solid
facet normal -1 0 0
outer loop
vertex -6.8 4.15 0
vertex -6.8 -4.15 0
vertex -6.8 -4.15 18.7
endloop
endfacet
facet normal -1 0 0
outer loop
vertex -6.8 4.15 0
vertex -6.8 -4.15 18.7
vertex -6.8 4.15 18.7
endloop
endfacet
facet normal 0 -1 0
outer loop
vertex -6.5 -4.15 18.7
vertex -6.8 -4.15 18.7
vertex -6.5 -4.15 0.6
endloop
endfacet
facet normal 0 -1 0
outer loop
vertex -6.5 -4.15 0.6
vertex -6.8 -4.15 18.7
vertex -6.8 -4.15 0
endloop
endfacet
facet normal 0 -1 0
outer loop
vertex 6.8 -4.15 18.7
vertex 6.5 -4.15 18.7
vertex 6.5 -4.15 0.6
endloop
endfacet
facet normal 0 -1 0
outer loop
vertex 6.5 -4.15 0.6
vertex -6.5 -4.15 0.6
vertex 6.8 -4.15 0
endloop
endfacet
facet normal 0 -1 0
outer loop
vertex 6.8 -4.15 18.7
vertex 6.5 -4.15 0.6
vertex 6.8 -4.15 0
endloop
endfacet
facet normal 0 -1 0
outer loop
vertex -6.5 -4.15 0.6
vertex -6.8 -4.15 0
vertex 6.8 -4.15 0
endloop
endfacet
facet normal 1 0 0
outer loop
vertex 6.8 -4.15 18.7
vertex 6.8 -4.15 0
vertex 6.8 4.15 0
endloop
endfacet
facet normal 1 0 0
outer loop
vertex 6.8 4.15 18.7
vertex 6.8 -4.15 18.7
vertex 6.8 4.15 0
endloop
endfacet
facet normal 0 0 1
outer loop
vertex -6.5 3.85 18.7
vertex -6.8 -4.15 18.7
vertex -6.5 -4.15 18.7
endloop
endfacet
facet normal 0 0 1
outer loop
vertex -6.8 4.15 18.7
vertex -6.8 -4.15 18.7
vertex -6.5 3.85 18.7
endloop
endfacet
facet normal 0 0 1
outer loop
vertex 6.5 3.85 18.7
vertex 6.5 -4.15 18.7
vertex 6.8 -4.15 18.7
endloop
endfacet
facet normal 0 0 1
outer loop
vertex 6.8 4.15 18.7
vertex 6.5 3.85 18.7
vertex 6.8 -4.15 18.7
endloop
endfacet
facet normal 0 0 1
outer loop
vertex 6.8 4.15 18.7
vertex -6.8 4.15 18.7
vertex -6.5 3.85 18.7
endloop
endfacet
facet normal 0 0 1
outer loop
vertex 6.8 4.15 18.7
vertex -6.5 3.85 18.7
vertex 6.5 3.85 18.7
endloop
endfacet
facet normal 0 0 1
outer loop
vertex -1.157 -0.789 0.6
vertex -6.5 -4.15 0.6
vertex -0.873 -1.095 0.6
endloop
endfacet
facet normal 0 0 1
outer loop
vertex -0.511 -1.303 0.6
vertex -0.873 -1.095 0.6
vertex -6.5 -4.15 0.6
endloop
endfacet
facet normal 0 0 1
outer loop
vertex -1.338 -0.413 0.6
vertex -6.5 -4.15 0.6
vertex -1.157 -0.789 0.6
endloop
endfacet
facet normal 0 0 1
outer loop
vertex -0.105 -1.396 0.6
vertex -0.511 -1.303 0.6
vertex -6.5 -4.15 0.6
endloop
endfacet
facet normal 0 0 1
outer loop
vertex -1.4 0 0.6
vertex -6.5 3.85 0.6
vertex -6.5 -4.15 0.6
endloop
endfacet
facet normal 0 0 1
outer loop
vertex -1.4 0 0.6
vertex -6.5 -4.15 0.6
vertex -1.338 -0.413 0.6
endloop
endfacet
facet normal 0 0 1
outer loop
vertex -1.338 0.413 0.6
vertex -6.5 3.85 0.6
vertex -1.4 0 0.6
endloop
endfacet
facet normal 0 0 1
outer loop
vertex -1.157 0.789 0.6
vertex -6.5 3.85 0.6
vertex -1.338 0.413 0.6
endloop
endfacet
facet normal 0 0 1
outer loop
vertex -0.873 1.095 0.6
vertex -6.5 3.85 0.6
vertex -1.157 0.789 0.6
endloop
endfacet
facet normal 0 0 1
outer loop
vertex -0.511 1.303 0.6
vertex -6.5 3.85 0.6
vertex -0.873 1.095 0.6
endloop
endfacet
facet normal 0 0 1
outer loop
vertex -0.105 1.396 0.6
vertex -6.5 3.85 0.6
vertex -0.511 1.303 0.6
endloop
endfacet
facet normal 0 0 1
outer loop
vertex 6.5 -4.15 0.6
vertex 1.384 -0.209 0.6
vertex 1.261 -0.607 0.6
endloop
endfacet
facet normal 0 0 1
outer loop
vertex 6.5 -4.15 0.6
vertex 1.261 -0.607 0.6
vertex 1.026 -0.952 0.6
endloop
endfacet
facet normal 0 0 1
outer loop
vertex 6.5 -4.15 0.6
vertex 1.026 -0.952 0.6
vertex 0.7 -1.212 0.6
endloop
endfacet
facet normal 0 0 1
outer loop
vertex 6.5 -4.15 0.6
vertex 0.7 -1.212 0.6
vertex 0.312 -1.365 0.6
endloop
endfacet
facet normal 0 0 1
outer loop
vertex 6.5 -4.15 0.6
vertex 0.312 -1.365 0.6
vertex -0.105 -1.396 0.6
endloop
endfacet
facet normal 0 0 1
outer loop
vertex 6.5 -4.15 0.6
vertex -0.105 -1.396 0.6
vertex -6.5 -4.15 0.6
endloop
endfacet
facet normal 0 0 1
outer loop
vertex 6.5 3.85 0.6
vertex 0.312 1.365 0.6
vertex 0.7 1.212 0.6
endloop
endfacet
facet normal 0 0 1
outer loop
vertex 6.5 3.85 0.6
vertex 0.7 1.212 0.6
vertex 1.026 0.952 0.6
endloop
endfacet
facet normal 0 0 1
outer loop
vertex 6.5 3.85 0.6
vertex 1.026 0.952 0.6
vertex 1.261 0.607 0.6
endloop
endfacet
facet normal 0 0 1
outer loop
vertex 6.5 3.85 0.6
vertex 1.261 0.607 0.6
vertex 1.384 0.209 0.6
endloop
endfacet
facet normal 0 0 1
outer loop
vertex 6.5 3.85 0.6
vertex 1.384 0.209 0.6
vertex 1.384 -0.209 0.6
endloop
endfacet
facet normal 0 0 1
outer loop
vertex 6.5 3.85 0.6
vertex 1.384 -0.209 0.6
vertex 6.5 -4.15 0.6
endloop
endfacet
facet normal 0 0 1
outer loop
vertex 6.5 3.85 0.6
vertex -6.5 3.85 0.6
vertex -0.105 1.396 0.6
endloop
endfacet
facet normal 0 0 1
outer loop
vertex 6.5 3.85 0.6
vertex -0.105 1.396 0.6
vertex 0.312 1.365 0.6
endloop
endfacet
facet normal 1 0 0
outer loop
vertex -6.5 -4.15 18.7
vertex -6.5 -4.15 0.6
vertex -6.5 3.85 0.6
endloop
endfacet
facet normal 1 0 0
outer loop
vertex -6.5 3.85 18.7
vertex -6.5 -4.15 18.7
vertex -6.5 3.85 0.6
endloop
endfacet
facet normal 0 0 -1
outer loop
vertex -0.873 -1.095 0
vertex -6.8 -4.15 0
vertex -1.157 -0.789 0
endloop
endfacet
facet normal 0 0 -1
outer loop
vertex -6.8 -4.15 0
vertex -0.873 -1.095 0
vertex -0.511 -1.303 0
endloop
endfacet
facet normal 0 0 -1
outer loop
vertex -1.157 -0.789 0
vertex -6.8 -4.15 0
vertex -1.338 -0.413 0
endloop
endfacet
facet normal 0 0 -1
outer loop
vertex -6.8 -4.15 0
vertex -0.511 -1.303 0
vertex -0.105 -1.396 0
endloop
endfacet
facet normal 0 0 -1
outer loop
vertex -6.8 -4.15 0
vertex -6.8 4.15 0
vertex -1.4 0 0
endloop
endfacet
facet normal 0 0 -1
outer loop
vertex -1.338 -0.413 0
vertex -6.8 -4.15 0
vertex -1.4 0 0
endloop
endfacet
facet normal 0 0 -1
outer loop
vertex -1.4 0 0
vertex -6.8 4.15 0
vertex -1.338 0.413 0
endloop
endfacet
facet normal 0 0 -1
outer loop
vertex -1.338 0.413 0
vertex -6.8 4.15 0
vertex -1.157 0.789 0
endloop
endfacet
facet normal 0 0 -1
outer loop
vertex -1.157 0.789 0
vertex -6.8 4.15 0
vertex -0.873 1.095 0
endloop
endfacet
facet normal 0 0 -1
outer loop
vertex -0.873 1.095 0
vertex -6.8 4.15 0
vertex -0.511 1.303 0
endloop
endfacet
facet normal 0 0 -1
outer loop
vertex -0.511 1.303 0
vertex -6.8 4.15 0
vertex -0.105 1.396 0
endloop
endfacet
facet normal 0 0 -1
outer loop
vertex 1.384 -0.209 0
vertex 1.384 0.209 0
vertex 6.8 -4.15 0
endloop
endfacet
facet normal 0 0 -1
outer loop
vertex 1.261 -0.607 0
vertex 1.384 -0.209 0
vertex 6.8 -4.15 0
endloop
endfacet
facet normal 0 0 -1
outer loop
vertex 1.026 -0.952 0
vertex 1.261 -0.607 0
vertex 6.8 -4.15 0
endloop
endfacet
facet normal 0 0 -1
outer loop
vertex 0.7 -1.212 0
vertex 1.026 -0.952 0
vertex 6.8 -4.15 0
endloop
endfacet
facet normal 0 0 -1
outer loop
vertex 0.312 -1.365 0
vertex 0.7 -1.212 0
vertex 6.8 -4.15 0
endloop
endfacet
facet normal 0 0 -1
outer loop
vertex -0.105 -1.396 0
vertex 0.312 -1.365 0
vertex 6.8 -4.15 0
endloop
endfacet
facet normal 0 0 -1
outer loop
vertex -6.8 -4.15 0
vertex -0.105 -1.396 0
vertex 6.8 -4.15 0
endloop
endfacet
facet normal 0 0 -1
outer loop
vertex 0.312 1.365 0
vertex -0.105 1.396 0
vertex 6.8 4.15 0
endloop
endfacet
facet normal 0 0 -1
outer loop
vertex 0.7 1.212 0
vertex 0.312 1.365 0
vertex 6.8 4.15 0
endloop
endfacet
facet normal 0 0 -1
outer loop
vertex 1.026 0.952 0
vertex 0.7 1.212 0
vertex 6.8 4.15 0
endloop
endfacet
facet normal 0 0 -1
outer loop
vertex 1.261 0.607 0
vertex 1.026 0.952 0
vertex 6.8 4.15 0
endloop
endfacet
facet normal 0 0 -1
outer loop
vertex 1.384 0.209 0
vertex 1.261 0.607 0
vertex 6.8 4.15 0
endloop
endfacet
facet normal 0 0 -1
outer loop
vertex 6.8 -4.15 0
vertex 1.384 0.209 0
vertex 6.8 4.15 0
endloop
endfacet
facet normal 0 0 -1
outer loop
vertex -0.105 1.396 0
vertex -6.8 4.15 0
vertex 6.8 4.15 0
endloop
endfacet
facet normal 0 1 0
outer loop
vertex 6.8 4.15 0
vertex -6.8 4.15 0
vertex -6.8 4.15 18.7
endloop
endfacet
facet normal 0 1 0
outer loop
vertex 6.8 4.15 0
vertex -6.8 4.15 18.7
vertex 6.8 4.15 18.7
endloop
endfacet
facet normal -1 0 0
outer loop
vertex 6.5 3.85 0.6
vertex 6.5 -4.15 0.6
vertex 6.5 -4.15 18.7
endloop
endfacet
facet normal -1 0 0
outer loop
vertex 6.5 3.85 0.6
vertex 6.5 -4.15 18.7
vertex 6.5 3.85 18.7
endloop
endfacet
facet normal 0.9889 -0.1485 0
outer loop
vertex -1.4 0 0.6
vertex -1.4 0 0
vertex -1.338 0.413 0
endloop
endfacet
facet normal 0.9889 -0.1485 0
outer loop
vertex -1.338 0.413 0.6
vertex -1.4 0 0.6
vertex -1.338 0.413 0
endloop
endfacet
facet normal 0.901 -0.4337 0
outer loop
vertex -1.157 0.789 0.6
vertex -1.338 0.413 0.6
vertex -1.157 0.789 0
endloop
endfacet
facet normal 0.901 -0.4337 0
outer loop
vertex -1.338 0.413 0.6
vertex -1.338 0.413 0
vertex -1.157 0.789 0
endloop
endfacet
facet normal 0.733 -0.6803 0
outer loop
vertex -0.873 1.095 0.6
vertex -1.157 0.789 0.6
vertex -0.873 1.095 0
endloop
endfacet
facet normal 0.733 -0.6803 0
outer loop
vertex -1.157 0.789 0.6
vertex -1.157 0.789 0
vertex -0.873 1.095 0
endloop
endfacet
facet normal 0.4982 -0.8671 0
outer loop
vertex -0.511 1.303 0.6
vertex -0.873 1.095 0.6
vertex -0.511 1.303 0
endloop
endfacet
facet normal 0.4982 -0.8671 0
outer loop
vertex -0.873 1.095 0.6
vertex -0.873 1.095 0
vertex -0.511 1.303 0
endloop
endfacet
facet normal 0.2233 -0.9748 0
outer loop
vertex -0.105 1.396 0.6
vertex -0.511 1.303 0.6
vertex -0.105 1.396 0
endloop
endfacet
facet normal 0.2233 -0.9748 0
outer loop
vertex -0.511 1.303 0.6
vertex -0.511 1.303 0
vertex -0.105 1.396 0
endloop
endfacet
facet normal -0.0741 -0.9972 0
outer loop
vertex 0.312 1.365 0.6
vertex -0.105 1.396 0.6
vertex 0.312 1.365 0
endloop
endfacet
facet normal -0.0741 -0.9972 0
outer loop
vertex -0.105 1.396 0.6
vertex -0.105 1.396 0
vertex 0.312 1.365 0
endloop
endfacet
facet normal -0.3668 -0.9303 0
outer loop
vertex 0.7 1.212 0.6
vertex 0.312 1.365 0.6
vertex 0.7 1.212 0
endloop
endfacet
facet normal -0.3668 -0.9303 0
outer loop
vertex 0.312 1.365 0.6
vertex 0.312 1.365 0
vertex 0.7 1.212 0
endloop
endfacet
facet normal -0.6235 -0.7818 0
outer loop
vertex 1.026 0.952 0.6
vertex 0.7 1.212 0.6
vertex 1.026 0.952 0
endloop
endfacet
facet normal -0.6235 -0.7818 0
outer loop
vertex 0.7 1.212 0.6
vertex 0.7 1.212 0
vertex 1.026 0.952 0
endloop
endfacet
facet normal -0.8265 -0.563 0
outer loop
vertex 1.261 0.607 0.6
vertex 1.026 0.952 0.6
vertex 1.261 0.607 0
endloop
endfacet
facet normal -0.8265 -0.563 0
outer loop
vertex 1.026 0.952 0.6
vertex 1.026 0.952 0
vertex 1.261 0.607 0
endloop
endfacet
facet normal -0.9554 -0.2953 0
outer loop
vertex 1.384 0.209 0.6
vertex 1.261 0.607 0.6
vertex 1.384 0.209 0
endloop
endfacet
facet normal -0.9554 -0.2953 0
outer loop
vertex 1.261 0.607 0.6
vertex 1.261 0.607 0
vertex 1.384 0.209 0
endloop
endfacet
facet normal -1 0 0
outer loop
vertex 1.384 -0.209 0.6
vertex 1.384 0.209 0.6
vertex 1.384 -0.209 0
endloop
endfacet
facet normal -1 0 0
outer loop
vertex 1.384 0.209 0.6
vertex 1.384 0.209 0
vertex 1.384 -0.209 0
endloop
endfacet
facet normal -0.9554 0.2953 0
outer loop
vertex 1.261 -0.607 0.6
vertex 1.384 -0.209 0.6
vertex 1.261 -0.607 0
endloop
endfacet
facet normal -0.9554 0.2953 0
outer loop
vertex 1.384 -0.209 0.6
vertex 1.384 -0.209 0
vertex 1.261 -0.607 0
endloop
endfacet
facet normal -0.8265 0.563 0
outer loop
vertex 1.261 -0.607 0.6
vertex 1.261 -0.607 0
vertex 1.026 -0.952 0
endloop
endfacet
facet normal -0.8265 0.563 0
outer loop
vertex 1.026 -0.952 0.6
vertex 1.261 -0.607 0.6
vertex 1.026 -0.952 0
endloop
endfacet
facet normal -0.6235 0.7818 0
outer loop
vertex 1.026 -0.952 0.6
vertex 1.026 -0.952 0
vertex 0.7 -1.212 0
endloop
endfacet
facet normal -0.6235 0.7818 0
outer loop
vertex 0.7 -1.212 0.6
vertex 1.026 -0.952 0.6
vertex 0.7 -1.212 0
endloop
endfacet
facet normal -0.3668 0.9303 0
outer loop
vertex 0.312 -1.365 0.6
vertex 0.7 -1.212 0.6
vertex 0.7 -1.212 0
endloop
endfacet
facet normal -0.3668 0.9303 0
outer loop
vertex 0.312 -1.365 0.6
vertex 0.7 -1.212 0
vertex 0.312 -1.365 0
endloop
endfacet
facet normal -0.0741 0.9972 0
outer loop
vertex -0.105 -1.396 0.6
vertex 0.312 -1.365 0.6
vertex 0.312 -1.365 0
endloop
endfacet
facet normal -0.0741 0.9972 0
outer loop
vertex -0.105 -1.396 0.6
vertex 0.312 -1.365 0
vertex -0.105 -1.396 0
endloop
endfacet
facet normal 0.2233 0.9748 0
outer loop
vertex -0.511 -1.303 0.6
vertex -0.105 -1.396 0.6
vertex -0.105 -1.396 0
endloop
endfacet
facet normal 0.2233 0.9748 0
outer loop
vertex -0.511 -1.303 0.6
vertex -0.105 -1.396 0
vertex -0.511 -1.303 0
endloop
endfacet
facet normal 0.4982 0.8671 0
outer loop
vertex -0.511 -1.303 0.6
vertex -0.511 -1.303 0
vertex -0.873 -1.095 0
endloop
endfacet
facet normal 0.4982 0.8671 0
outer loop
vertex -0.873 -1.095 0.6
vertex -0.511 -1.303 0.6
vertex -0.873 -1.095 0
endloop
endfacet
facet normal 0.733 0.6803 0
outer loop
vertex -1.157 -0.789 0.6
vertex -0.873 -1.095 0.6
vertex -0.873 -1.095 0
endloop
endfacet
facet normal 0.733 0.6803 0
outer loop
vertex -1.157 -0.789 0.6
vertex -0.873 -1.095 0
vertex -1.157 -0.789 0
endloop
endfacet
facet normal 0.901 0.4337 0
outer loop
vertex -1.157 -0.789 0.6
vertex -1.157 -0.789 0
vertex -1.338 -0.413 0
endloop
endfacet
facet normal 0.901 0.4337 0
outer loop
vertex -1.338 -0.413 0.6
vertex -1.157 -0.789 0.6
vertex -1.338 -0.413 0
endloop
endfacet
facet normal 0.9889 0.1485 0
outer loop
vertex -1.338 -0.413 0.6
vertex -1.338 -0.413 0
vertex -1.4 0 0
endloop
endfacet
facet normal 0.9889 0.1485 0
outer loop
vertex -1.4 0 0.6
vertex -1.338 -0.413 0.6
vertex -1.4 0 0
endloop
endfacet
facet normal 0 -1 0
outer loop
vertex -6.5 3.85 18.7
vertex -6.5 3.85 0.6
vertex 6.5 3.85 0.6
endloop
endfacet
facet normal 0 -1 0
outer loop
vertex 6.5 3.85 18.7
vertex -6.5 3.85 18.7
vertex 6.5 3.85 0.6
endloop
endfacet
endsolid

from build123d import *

# Parameters (mm, degrees)
ESBO_O1_W                  = 13.6
ESBO_O1_H                  = 8.3
RESSALTO_EXTRUS_O1_DEPTH   = 18.7
CORTE_EXTRUS_O1_DEPTH      = 21.326153104
CORTE_EXTRUS_O1_DEPTH_BACK = 18.1
ESBO_O4_W                  = 13
ESBO_O4_H                  = 8
CORTE_EXTRUS_O2_REACH      = 22.326
ESBO_O5_R                  = 1.4


with BuildPart() as part:
    # Esboço1 → Ressalto-extrusão1 (new body)
    with BuildSketch(Plane.XY):
        Rectangle(ESBO_O1_W, ESBO_O1_H)
    extrude(amount=RESSALTO_EXTRUS_O1_DEPTH)

    # Esboço4 → Corte-extrusão1 (cut, two sides: drawn at the far end of the back side and taken through both)
    with BuildSketch(Plane.XY.offset(18.7).offset(-CORTE_EXTRUS_O1_DEPTH_BACK)):
        with Locations((0, -0.15)):
            Rectangle(ESBO_O4_W, ESBO_O4_H)
    extrude(amount=CORTE_EXTRUS_O1_DEPTH + CORTE_EXTRUS_O1_DEPTH_BACK, mode=Mode.SUBTRACT)

    # Esboço5 → Corte-extrusão2 (cut, up to next)
    with BuildSketch(Plane(origin=(0, 0, 0), x_dir=(-1, 0, 0), z_dir=(0, 0, -1)), mode=Mode.PRIVATE) as corte_extrus_o2_sk1:
        Circle(ESBO_O5_R)
    corte_extrus_o2_tool1 = extrude(corte_extrus_o2_sk1.sketch, amount=-CORTE_EXTRUS_O2_REACH, mode=Mode.PRIVATE) & part.part
    add(corte_extrus_o2_tool1.solids().sort_by_distance((0, 0, 0))[0], mode=Mode.SUBTRACT)


solid = part.part
